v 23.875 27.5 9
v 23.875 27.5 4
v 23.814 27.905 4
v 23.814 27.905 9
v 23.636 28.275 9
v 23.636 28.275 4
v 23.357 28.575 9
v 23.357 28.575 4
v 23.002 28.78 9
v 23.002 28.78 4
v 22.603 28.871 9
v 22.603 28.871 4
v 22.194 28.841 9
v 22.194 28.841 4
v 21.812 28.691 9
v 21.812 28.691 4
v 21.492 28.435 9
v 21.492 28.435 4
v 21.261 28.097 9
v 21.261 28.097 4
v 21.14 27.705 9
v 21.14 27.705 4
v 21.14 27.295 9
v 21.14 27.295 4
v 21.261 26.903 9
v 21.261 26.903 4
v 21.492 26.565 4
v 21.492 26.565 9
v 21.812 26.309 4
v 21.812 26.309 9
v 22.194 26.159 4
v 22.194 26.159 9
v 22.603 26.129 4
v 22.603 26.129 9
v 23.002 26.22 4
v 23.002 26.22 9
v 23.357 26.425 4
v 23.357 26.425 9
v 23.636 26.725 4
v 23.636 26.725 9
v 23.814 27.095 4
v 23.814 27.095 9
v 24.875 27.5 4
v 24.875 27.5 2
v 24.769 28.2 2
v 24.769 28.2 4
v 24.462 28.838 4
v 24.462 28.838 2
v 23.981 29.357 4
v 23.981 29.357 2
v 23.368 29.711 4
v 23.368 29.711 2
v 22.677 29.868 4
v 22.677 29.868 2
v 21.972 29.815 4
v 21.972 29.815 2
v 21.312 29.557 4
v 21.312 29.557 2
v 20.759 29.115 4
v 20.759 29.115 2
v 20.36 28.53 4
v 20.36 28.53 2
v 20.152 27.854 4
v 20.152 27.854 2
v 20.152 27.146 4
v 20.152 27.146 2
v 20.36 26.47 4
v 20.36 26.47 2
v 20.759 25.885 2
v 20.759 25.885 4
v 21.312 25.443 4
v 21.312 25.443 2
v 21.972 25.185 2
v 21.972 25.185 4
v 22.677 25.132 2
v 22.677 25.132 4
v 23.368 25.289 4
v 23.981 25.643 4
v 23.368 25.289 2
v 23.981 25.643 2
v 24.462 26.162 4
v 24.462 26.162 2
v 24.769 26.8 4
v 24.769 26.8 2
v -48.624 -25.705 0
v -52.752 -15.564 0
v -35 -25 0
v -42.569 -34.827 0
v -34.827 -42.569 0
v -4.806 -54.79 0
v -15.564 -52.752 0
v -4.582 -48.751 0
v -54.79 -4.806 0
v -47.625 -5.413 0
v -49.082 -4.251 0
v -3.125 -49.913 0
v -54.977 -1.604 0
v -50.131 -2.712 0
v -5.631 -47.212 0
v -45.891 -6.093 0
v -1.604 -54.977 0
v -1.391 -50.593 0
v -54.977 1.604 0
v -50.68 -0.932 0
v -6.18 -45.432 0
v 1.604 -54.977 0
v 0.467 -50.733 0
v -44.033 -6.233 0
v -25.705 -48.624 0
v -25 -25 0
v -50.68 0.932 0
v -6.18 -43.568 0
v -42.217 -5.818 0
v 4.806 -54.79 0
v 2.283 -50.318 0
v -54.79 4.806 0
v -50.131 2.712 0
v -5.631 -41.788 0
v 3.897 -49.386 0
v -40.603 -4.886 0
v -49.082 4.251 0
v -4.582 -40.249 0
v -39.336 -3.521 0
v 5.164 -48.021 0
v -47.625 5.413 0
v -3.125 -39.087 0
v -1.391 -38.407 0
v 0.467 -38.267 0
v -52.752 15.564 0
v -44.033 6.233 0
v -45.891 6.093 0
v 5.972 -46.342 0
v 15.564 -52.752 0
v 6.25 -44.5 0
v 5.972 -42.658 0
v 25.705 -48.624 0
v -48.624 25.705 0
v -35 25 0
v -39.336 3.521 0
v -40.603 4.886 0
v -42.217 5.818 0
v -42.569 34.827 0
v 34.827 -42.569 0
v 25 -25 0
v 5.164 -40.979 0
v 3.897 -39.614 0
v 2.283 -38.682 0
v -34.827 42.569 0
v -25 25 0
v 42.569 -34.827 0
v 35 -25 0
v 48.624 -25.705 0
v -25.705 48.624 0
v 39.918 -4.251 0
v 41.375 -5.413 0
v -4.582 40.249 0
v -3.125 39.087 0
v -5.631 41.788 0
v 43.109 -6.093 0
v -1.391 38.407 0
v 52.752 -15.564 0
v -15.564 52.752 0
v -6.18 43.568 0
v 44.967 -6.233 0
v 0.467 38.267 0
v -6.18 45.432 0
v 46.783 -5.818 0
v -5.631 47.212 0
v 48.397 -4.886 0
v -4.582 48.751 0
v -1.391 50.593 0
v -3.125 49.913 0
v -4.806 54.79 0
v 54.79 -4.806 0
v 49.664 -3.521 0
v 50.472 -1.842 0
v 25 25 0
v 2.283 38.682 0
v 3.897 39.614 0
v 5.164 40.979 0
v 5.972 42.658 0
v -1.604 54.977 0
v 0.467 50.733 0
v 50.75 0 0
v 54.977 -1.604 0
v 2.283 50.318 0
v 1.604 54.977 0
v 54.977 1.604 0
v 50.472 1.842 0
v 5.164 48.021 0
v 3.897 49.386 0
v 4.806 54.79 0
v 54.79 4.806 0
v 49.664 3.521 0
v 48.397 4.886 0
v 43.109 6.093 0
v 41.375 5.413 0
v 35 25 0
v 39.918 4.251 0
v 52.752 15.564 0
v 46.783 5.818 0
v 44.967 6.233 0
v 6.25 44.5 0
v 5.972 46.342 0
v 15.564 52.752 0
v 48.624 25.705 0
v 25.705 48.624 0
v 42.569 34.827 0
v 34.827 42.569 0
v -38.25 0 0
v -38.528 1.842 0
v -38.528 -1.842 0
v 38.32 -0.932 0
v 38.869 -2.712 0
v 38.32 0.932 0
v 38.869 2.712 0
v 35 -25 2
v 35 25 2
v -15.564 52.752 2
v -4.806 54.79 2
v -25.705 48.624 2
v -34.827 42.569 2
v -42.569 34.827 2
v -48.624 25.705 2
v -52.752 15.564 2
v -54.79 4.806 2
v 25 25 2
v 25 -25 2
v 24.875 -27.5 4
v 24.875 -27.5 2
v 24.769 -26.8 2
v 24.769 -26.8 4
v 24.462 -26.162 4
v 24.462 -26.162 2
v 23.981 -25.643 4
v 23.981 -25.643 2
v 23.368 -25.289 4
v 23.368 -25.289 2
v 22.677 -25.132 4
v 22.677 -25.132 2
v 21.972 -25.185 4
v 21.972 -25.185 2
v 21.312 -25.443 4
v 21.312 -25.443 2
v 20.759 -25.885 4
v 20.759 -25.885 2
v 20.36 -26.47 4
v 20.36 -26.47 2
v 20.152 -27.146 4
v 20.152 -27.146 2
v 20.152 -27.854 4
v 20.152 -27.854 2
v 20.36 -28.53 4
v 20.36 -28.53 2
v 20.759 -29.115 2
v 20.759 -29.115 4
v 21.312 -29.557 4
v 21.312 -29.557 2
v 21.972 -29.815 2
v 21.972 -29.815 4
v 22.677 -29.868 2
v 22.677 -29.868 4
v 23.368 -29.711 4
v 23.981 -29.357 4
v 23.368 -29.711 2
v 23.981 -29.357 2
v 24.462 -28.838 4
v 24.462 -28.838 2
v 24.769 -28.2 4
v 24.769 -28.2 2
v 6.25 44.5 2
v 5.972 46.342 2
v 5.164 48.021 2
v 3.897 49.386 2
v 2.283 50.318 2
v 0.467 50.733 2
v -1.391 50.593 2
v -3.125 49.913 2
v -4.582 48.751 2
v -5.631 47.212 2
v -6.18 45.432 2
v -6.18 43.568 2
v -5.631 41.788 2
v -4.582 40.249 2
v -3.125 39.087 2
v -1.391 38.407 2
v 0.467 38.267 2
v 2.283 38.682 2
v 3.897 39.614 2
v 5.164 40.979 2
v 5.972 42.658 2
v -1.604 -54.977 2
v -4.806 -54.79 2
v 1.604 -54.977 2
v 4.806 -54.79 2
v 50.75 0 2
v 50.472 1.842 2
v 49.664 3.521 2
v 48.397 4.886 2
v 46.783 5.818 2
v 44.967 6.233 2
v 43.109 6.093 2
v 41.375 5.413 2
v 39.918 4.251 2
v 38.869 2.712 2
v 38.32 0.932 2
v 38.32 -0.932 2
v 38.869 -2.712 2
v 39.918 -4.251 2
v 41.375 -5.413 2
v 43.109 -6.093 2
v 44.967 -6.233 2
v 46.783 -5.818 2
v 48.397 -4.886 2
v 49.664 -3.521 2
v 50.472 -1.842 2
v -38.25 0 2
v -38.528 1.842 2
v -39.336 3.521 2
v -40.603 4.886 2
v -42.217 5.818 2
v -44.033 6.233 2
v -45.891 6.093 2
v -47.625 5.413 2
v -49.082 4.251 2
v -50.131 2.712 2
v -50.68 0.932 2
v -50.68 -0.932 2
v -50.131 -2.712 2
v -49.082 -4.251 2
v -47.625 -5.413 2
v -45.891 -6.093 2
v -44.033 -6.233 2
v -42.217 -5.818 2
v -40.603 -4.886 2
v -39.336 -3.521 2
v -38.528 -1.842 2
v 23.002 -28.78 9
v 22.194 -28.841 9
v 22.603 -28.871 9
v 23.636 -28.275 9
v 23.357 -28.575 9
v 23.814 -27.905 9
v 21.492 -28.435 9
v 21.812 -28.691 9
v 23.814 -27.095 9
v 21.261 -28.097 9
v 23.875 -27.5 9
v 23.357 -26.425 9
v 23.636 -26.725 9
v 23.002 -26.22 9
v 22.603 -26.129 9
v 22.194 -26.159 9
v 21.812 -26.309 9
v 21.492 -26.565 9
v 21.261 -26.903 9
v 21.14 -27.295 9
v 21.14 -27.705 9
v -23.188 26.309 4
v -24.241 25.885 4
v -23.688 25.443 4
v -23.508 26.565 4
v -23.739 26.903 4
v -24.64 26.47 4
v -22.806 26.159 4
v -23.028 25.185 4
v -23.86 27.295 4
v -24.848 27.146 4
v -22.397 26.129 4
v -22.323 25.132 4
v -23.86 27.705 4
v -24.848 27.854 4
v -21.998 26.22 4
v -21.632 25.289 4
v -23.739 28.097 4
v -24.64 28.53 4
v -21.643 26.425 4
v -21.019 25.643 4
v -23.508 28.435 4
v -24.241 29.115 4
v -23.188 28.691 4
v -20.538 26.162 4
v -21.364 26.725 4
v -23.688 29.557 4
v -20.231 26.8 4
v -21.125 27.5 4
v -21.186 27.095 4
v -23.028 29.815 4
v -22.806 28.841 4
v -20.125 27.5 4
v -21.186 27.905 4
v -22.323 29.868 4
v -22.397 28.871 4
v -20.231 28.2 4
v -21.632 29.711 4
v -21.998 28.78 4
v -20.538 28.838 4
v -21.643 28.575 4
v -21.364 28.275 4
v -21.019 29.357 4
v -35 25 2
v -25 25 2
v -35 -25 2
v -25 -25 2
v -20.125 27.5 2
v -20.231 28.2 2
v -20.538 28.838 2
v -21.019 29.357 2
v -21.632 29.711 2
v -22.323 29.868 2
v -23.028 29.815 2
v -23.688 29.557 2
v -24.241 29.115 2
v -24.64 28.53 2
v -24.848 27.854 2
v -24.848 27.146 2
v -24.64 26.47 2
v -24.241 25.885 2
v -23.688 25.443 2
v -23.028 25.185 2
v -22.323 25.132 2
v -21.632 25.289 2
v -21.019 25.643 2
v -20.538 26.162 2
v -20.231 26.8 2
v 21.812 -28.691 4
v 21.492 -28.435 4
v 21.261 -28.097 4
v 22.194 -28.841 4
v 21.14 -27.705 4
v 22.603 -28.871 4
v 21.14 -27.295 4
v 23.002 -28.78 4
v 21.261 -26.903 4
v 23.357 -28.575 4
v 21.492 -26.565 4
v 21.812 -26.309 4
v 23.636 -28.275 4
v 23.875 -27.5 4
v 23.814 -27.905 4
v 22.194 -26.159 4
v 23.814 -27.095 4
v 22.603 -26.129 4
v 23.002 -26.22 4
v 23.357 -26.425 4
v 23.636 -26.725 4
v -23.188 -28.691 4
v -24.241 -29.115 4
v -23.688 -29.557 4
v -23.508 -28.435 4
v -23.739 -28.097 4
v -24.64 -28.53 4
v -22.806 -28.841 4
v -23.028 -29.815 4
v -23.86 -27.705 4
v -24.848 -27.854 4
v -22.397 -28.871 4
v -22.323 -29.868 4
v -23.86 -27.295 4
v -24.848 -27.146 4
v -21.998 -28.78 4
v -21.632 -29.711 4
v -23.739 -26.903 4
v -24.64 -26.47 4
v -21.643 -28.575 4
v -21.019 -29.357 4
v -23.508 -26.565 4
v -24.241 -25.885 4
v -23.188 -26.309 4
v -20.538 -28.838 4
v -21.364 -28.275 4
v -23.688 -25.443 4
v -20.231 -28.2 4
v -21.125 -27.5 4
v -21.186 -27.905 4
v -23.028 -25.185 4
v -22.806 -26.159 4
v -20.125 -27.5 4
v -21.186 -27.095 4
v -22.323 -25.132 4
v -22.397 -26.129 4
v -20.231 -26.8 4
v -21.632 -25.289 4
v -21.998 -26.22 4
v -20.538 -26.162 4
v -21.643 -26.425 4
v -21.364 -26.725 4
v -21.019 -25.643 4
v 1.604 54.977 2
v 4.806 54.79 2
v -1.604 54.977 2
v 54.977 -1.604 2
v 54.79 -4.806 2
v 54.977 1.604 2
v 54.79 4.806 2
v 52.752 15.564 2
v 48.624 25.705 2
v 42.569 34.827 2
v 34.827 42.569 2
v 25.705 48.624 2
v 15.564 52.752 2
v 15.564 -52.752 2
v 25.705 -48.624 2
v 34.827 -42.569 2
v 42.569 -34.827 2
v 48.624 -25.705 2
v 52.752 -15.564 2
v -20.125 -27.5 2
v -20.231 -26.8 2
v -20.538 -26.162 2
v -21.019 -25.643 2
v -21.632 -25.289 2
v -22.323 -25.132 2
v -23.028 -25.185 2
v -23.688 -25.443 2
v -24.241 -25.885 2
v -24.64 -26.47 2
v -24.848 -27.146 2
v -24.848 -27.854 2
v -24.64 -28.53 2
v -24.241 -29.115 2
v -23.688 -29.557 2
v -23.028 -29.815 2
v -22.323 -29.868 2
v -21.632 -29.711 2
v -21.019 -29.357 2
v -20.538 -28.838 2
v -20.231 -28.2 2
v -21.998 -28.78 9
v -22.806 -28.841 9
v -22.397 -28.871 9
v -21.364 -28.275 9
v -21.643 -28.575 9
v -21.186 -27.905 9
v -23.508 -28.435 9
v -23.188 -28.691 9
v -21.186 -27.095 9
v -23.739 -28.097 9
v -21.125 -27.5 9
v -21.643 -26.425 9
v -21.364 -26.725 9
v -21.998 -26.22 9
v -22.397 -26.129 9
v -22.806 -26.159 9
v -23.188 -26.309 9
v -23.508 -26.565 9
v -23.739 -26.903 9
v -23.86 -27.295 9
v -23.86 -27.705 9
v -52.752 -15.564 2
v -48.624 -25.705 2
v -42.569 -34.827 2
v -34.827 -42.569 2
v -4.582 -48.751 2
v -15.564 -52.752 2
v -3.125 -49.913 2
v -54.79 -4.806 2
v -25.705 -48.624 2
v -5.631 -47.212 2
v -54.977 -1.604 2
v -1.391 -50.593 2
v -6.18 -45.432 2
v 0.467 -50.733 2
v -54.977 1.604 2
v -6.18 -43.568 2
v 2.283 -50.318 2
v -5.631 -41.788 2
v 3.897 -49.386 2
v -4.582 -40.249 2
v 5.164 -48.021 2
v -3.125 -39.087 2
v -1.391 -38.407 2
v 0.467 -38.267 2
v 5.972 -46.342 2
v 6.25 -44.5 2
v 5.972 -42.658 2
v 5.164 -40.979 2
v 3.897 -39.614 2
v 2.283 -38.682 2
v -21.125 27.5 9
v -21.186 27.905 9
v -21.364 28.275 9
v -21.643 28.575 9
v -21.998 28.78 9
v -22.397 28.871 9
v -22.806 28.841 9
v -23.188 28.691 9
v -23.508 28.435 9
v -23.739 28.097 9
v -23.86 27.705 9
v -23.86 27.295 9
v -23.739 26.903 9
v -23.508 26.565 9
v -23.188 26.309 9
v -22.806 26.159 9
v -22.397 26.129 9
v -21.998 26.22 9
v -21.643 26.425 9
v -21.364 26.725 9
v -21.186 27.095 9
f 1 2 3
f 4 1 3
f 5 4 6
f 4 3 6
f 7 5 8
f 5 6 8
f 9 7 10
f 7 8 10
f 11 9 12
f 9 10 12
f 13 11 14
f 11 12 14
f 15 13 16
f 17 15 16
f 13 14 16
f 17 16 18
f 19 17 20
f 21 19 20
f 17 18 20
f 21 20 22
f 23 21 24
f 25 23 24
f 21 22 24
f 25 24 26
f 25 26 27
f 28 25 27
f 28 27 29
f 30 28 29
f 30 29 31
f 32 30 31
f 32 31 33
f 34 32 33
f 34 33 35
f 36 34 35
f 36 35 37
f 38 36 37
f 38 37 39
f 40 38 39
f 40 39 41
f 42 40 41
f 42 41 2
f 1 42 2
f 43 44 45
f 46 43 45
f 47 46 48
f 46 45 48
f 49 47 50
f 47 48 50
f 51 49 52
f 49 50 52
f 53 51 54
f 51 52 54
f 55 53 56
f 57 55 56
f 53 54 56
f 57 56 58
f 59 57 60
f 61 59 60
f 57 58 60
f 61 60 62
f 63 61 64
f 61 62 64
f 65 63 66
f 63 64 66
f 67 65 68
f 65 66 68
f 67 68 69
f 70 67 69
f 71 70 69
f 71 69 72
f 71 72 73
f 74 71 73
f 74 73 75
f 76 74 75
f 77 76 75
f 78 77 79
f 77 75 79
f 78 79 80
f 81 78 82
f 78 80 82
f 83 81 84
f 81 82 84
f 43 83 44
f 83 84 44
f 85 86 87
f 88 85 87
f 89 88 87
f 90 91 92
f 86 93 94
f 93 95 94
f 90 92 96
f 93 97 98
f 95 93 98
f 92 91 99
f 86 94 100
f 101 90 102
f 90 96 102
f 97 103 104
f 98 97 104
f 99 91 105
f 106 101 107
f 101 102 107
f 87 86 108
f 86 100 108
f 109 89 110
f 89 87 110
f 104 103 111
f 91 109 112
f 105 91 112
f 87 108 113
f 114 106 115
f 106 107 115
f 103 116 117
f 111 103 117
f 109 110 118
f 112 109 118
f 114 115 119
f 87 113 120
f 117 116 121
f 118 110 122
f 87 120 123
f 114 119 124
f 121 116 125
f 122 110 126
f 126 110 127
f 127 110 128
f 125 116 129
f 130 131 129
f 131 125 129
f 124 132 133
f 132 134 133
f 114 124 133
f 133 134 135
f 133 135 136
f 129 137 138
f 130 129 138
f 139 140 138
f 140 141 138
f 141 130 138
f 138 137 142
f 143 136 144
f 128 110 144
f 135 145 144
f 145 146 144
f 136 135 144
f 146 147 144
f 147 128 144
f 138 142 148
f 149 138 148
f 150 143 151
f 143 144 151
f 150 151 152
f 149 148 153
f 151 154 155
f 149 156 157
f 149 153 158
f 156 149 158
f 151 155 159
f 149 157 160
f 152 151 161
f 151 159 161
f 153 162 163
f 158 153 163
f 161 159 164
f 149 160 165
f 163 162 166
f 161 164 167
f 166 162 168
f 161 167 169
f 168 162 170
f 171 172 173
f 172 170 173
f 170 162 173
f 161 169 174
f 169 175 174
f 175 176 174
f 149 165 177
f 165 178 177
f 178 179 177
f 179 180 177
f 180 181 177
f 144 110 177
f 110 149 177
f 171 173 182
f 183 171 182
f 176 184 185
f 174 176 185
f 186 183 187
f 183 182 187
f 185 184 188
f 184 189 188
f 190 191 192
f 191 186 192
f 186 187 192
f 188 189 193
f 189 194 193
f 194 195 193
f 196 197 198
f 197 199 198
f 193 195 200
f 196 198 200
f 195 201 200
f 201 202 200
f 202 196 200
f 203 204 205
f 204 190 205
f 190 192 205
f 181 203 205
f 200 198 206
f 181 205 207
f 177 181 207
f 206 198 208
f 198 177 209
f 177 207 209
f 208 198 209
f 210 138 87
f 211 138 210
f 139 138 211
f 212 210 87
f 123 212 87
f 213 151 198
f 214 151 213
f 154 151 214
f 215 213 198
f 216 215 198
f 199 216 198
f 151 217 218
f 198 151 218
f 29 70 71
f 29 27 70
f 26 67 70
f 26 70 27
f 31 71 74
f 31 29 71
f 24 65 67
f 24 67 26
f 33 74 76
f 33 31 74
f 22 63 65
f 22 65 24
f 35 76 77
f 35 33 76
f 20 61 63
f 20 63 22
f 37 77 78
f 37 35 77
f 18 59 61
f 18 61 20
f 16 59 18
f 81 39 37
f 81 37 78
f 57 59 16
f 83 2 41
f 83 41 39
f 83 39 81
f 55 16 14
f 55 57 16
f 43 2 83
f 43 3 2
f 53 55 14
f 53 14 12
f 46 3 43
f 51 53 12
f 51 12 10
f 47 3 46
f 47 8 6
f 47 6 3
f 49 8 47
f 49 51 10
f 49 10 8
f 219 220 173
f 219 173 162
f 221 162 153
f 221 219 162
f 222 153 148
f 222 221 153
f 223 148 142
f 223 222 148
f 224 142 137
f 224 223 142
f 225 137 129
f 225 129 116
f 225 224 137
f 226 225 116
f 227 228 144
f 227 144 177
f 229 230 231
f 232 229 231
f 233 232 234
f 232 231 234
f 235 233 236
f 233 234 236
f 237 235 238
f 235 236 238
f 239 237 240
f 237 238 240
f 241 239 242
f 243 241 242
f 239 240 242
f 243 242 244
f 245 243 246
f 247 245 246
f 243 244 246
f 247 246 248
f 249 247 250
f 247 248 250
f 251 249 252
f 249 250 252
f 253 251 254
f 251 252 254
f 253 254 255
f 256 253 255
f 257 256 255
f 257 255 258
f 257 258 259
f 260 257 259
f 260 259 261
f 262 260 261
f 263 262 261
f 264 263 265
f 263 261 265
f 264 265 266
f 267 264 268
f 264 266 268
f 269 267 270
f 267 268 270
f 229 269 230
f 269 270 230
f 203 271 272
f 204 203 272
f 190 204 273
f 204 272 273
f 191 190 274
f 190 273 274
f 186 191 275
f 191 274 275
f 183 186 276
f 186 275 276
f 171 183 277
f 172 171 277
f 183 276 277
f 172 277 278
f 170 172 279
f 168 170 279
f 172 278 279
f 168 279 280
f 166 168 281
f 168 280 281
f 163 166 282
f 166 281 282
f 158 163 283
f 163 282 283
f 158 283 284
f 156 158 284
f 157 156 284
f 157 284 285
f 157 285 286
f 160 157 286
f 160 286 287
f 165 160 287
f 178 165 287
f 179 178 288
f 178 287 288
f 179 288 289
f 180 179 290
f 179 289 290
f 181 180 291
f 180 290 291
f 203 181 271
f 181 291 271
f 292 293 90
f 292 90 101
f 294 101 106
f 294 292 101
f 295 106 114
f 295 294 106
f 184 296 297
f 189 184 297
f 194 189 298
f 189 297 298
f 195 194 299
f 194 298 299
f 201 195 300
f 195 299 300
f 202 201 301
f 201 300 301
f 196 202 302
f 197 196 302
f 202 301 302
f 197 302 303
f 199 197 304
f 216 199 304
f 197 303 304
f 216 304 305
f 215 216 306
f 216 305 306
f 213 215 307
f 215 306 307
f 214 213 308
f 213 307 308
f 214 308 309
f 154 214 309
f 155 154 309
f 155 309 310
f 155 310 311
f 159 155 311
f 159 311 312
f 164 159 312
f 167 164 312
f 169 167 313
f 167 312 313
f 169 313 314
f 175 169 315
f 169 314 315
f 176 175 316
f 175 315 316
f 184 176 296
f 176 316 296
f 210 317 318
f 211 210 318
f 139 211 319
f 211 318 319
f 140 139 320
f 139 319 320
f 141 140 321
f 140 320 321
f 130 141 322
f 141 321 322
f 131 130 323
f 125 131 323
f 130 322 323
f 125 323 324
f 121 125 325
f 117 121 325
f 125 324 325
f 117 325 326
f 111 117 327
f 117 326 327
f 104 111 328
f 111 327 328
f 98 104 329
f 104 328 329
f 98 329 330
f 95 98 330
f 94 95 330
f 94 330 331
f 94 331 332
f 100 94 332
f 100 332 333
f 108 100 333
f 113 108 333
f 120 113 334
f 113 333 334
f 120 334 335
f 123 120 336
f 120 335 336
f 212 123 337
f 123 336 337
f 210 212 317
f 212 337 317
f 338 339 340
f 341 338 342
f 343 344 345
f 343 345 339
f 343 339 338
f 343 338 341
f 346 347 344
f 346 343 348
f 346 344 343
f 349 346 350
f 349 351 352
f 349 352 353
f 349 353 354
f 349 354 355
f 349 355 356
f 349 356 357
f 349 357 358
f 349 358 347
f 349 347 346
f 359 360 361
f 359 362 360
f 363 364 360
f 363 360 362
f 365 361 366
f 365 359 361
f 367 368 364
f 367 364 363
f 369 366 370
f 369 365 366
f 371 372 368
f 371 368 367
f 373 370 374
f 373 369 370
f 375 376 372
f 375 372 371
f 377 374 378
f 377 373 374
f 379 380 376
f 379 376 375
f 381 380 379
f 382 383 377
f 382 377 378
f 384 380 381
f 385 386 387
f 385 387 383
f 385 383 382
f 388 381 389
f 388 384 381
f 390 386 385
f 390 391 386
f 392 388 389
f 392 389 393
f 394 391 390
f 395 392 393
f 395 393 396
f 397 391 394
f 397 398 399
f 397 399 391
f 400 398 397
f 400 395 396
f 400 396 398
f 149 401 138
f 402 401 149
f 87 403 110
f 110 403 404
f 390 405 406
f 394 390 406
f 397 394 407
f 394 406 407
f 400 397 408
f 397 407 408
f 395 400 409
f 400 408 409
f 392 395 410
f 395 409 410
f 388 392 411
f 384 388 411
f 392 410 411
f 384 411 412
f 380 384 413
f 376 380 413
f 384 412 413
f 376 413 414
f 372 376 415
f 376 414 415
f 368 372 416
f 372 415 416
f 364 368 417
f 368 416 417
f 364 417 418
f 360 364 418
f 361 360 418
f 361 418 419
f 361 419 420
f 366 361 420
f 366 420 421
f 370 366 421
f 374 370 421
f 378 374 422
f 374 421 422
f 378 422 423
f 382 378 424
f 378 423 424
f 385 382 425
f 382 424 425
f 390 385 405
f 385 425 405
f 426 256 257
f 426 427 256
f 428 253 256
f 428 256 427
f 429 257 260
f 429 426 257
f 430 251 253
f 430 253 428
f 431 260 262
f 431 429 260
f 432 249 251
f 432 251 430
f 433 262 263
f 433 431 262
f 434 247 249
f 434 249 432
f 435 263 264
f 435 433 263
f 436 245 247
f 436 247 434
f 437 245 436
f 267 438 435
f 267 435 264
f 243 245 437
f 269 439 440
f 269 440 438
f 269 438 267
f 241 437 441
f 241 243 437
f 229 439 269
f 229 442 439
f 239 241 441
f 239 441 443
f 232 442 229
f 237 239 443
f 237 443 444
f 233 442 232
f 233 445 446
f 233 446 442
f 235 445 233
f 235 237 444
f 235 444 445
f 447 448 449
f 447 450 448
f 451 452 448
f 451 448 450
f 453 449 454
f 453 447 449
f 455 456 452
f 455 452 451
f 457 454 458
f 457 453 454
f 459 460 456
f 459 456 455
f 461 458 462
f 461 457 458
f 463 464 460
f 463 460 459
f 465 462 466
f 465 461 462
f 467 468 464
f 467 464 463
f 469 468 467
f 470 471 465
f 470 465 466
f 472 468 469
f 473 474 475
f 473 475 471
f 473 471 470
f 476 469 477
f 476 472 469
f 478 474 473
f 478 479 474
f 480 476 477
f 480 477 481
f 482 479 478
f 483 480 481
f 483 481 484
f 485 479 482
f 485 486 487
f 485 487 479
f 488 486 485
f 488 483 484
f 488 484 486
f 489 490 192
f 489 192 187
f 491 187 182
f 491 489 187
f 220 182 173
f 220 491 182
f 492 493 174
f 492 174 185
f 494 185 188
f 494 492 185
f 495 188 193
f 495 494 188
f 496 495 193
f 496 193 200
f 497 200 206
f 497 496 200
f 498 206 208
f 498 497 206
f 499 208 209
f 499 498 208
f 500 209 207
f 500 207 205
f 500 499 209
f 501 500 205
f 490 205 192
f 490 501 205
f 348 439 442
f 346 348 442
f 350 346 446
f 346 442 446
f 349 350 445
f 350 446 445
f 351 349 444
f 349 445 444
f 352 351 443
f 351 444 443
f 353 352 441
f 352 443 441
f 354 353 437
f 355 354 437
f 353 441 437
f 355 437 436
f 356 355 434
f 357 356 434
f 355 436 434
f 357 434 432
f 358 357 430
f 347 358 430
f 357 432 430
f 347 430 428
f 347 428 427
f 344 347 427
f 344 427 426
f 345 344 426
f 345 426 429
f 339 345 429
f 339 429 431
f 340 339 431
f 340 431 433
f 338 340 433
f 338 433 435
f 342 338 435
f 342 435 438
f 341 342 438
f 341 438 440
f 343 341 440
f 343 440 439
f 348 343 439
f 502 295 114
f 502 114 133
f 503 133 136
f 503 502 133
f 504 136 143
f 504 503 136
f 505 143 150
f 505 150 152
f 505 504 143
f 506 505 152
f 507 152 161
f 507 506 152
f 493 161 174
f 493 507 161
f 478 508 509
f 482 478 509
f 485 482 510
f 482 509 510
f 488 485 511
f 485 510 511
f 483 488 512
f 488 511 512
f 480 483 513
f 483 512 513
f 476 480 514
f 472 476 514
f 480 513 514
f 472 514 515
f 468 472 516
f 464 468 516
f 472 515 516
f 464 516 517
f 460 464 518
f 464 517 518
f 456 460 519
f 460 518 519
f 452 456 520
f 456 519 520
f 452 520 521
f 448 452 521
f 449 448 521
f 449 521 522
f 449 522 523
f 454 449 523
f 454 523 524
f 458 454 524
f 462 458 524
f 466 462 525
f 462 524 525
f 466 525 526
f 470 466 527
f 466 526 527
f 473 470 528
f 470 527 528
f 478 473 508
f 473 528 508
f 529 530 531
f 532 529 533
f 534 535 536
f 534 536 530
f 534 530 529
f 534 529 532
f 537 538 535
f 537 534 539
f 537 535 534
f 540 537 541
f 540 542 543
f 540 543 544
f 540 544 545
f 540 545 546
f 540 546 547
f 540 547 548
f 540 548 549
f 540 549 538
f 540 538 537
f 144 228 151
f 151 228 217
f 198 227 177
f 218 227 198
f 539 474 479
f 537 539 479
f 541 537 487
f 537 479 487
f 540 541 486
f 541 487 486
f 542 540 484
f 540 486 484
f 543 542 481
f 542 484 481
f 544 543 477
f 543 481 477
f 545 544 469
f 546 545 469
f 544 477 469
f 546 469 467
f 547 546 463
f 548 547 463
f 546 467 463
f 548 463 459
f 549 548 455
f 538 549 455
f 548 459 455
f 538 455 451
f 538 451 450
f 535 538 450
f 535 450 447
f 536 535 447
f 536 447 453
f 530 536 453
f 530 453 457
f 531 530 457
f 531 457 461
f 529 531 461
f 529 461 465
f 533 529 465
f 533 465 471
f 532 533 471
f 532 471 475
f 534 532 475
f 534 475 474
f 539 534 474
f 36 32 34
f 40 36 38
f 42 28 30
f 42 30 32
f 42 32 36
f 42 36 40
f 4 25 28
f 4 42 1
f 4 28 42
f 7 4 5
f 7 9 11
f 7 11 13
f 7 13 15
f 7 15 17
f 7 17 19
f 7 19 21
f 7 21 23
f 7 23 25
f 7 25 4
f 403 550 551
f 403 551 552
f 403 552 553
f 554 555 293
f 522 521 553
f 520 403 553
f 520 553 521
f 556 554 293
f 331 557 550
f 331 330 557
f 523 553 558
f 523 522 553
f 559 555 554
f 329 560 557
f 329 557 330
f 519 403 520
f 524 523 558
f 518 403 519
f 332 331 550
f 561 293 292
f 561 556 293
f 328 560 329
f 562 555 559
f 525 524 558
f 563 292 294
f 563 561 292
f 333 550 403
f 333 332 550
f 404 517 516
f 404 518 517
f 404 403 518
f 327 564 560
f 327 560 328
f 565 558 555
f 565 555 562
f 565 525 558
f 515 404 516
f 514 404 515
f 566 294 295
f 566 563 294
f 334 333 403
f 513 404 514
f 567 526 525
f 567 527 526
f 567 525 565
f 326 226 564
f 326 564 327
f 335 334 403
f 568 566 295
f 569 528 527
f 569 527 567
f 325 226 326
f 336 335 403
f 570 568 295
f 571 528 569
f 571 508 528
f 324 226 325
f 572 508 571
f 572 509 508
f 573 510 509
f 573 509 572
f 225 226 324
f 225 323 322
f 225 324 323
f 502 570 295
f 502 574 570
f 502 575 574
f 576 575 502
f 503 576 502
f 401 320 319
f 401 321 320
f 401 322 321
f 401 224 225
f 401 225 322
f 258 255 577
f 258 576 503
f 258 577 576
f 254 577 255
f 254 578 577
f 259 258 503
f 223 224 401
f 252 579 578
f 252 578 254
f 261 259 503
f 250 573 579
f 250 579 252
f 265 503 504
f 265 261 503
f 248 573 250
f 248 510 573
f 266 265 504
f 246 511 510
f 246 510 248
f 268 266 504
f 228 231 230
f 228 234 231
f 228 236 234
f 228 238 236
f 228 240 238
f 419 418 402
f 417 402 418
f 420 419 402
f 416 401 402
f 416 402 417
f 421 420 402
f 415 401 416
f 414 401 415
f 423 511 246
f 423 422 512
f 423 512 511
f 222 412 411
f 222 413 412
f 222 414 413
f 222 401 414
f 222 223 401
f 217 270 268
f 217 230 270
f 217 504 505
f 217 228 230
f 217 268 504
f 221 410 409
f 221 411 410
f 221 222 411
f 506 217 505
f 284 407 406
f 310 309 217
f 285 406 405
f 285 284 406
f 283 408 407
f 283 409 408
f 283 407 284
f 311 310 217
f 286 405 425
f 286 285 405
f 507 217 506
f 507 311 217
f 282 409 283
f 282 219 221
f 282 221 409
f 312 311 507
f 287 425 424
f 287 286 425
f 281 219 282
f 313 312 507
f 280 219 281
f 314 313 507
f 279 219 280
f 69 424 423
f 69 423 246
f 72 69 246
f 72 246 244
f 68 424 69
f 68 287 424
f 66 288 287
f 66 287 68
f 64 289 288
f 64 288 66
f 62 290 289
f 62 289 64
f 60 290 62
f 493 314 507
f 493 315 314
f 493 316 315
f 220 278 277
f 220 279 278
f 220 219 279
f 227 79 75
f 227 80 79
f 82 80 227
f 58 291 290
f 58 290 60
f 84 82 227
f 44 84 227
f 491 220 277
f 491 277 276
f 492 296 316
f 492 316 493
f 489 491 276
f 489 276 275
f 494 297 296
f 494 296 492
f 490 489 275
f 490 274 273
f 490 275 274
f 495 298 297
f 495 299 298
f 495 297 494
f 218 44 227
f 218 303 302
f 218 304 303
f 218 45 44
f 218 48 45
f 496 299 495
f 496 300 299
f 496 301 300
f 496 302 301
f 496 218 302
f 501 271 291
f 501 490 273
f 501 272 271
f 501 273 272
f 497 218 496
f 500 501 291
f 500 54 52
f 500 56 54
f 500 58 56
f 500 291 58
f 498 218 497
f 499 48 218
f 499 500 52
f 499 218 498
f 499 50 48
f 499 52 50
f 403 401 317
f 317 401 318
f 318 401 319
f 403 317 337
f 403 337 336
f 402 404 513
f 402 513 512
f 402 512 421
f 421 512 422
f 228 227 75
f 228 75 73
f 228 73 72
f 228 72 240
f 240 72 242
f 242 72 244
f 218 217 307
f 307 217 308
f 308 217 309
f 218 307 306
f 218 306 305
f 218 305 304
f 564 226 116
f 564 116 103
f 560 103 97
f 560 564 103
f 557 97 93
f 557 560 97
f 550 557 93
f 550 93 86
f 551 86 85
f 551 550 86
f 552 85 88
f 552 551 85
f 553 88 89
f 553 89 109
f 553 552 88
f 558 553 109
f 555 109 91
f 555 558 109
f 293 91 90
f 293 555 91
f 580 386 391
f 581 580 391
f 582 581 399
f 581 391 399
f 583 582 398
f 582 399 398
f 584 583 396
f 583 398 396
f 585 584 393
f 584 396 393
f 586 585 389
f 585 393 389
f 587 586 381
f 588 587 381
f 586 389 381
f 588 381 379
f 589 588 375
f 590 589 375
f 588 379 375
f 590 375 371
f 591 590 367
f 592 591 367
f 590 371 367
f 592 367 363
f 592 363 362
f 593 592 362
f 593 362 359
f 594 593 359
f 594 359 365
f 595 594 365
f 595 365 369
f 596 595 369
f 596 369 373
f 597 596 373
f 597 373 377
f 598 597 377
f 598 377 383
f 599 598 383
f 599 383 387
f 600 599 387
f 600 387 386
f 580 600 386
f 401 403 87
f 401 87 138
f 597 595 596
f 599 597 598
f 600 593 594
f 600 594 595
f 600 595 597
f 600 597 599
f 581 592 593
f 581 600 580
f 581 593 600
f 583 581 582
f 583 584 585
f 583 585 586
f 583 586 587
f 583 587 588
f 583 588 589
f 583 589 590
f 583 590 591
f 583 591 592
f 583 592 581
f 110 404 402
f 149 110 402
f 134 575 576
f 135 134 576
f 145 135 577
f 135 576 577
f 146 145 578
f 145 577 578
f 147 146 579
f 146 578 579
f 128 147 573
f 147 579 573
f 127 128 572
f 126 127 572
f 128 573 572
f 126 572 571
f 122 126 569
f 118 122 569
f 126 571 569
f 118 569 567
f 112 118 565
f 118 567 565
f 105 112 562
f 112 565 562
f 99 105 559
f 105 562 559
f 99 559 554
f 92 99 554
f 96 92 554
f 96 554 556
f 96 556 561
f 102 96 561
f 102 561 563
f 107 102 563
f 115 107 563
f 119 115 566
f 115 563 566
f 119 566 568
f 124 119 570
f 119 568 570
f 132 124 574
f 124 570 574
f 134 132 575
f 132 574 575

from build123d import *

# Parameters (mm, degrees)
SKETCH4_R           = 59
BOSS_EXTRUDE3_DEPTH = 2
SKETCH5_R           = 1.375
BOSS_EXTRUDE5_DEPTH = 7
SKETCH8_R           = 2.375
BOSS_EXTRUDE6_DEPTH = 2
BOSS_EXTRUDE7_DEPTH = 18
SKETCH10_R          = 7.5
CUT_EXTRUDE1_DEPTH  = 18
SKETCH12_R          = 57.5
CUT_EXTRUDE2_DEPTH  = 5
CUT_EXTRUDE3_DEPTH  = 5.5
SKETCH15_R          = 89.714021058
SKETCH15_R_2        = 57
CUT_EXTRUDE4_DEPTH  = 22
SKETCH16_R          = 62.462022857
CUT_EXTRUDE8_DEPTH  = 52
CUT_EXTRUDE9_DEPTH  = 52
SKETCH18_R          = 80.62246508
SKETCH18_R_2        = 55
CUT_EXTRUDE10_DEPTH = 10
SKETCH19_R          = 55
BOSS_EXTRUDE8_DEPTH = 2
SKETCH20_R          = 6.25
CUT_EXTRUDE11_DEPTH = 2
SKETCH21_W          = 10
SKETCH21_H          = 50
CUT_EXTRUDE12_DEPTH = 3


with BuildPart() as part:
    # Sketch4 → Boss-Extrude3 (new body)
    with BuildSketch(Plane.XY):
        Circle(SKETCH4_R)
    extrude(amount=BOSS_EXTRUDE3_DEPTH)

    # Sketch5 → Boss-Extrude5 (add)
    with BuildSketch(Plane.XY.offset(2)):
        with Locations((-22.5, 27.5)):
            Circle(SKETCH5_R)
        with Locations((22.5, 27.5)):
            Circle(SKETCH5_R)
        with Locations((22.5, -27.5)):
            Circle(SKETCH5_R)
        with Locations((-22.5, -27.5)):
            Circle(SKETCH5_R)
    extrude(amount=BOSS_EXTRUDE5_DEPTH)

    # Sketch8 → Boss-Extrude6 (add)
    with BuildSketch(Plane.XY.offset(2)):
        with Locations((-22.5, 27.5)):
            Circle(SKETCH8_R)
        with Locations((22.5, 27.5)):
            Circle(SKETCH8_R)
        with Locations((-22.5, -27.5)):
            Circle(SKETCH8_R)
        with Locations((22.5, -27.5)):
            Circle(SKETCH8_R)
    extrude(amount=BOSS_EXTRUDE6_DEPTH)

    # Sketch9 → Boss-Extrude7 (add)
    with BuildSketch(Plane.XY.offset(2)):
        with BuildLine():
            ThreePointArc((-4.745762712, 55.798546005), (0, 56), (4.745762712, 55.798546005))
            Line((4.745762712, 55.798546005), (5, 58.787753827))
            ThreePointArc((5, 58.787753827), (0, 59), (-5, 58.787753827))
            Line((-5, 58.787753827), (-4.745762712, 55.798546005))
        make_face()
        with BuildLine():
            Line((-55.798546005, 4.745762712), (-58.787753827, 5))
            ThreePointArc((-58.787753827, 5), (-59, 0), (-58.787753827, -5))
            Line((-58.787753827, -5), (-55.798546005, -4.745762712))
            ThreePointArc((-55.798546005, -4.745762712), (-56, 0), (-55.798546005, 4.745762712))
        make_face()
        with BuildLine():
            ThreePointArc((58.787753827, -5), (59, 0), (58.787753827, 5))
            Line((58.787753827, 5), (55.798546005, 4.745762712))
            ThreePointArc((55.798546005, 4.745762712), (56, 0), (55.798546005, -4.745762712))
            Line((55.798546005, -4.745762712), (58.787753827, -5))
        make_face()
        with BuildLine():
            ThreePointArc((-4.745762712, -55.798546005), (0, -56), (4.745762712, -55.798546005))
            Line((4.745762712, -55.798546005), (5, -58.787753827))
            ThreePointArc((5, -58.787753827), (0, -59), (-5, -58.787753827))
            Line((-5, -58.787753827), (-4.745762712, -55.798546005))
        make_face()
    extrude(amount=BOSS_EXTRUDE7_DEPTH)

    # Sketch10 → Cut-Extrude1 (cut)
    with BuildSketch(Plane.XY.offset(2)):
        with Locations((-40, 0)):
            Circle(SKETCH10_R)
    extrude(amount=-CUT_EXTRUDE1_DEPTH, mode=Mode.SUBTRACT)

    # Sketch12 → Cut-Extrude2 (cut)
    with BuildSketch(Plane.XY.offset(20)):
        Circle(SKETCH12_R)
    extrude(amount=-CUT_EXTRUDE2_DEPTH, mode=Mode.SUBTRACT)

    # Sketch13 → Cut-Extrude3 (cut)
    with BuildSketch(Plane(origin=(0, 0, 0), x_dir=(-1, 0, 0), z_dir=(0, 0, -1))):
        with BuildLine():
            Line((-57.243329786, 4.868644068), (-58.787753827, 5))
            ThreePointArc((-58.787753827, 5), (-59, 0), (-58.787753827, -5))
            Line((-58.787753827, -5), (-57.243329786, -4.868644068))
            ThreePointArc((-57.243329786, -4.868644068), (-57.45, 0), (-57.243329786, 4.868644068))
        make_face()
        with BuildLine():
            ThreePointArc((5, 58.787753827), (0, 59), (-5, 58.787753827))
            Line((-5, 58.787753827), (-4.868644068, 57.243329786))
            ThreePointArc((-4.868644068, 57.243329786), (0, 57.45), (4.868644068, 57.243329786))
            Line((4.868644068, 57.243329786), (5, 58.787753827))
        make_face()
        with BuildLine():
            Line((-4.868644068, -57.243329786), (-5, -58.787753827))
            ThreePointArc((-5, -58.787753827), (0, -59), (5, -58.787753827))
            Line((5, -58.787753827), (4.868644068, -57.243329786))
            ThreePointArc((4.868644068, -57.243329786), (0, -57.45), (-4.868644068, -57.243329786))
        make_face()
        with BuildLine():
            ThreePointArc((58.787753827, -5), (59, 0), (58.787753827, 5))
            Line((58.787753827, 5), (57.243329786, 4.868644068))
            ThreePointArc((57.243329786, 4.868644068), (57.45, 0), (57.243329786, -4.868644068))
            Line((57.243329786, -4.868644068), (58.787753827, -5))
        make_face()
    extrude(amount=-CUT_EXTRUDE3_DEPTH, mode=Mode.SUBTRACT)

    # Sketch15 → Cut-Extrude4 (cut)
    with BuildSketch(Plane(origin=(0, 0, 0), x_dir=(-1, 0, 0), z_dir=(0, 0, -1))):
        Circle(SKETCH15_R)
        Circle(SKETCH15_R_2, mode=Mode.SUBTRACT)
    extrude(amount=-CUT_EXTRUDE4_DEPTH, mode=Mode.SUBTRACT)

    # Sketch16 → Cut-Extrude8 (cut)
    with BuildSketch(Plane.XY.offset(2)):
        Circle(SKETCH16_R)
        with BuildLine():
            Line((55.798546005, 4.745762712), (56.794948612, 4.830508475))
            ThreePointArc((56.794948612, 4.830508475), (40.305086528, 40.305086528), (4.830508475, 56.794948612))
            Line((4.830508475, 56.794948612), (4.745762712, 55.798546005))
            ThreePointArc((4.745762712, 55.798546005), (0, 56), (-4.745762712, 55.798546005))
            Line((-4.745762712, 55.798546005), (-4.830508475, 56.794948612))
            ThreePointArc((-4.830508475, 56.794948612), (-40.305086528, 40.305086528), (-56.794948612, 4.830508475))
            Line((-56.794948612, 4.830508475), (-55.798546005, 4.745762712))
            ThreePointArc((-55.798546005, 4.745762712), (-56, 0), (-55.798546005, -4.745762712))
            Line((-55.798546005, -4.745762712), (-56.794948612, -4.830508475))
            ThreePointArc((-56.794948612, -4.830508475), (-40.305086528, -40.305086528), (-4.830508475, -56.794948612))
            Line((-4.830508475, -56.794948612), (-4.745762712, -55.798546005))
            ThreePointArc((-4.745762712, -55.798546005), (0, -56), (4.745762712, -55.798546005))
            Line((4.745762712, -55.798546005), (4.830508475, -56.794948612))
            ThreePointArc((4.830508475, -56.794948612), (40.305086528, -40.305086528), (56.794948612, -4.830508475))
            Line((56.794948612, -4.830508475), (55.798546005, -4.745762712))
            ThreePointArc((55.798546005, -4.745762712), (56, 0), (55.798546005, 4.745762712))
        make_face(mode=Mode.SUBTRACT)
    extrude(amount=CUT_EXTRUDE8_DEPTH, mode=Mode.SUBTRACT)

    # Sketch17 → Cut-Extrude9 (cut)
    with BuildSketch(Plane.XY.offset(2)):
        with BuildLine():
            Line((-5, 57), (5, 57))
            Line((5, 57), (4.806106124, 54.789609817))
            ThreePointArc((4.806106124, 54.789609817), (0, 55), (-4.806106124, 54.789609817))
            Line((-4.806106124, 54.789609817), (-5, 57))
        make_face()
        with BuildLine():
            Line((54.789609817, 4.806106124), (57, 5))
            Line((57, 5), (57, -5))
            Line((57, -5), (54.789609817, -4.806106124))
            ThreePointArc((54.789609817, -4.806106124), (55, 0), (54.789609817, 4.806106124))
        make_face()
        with BuildLine():
            Line((4.806106124, -54.789609817), (5, -57))
            Line((5, -57), (-5, -57))
            Line((-5, -57), (-4.806106124, -54.789609817))
            ThreePointArc((-4.806106124, -54.789609817), (0, -55), (4.806106124, -54.789609817))
        make_face()
        with BuildLine():
            Line((-54.789609817, -4.806106124), (-57, -5))
            Line((-57, -5), (-57, 5))
            Line((-57, 5), (-54.789609817, 4.806106124))
            ThreePointArc((-54.789609817, 4.806106124), (-55, 0), (-54.789609817, -4.806106124))
        make_face()
    extrude(amount=-CUT_EXTRUDE9_DEPTH, mode=Mode.SUBTRACT)

    # Sketch18 → Cut-Extrude10 (cut)
    with BuildSketch(Plane.XY.offset(2)):
        Circle(SKETCH18_R)
        Circle(SKETCH18_R_2, mode=Mode.SUBTRACT)
    extrude(amount=-CUT_EXTRUDE10_DEPTH, mode=Mode.SUBTRACT)

    # Sketch19 → Boss-Extrude8 (add)
    with BuildSketch(Plane.XY.offset(2)):
        Circle(SKETCH19_R)
    extrude(amount=-BOSS_EXTRUDE8_DEPTH)

    # Sketch20 → Cut-Extrude11 (cut)
    with BuildSketch(Plane.XY.offset(2)):
        with Locations((0, 44.5)):
            Circle(SKETCH20_R)
        with Locations((44.5, 0)):
            Circle(SKETCH20_R)
        with Locations((0, -44.5)):
            Circle(SKETCH20_R)
        with Locations((-44.5, 0)):
            Circle(SKETCH20_R)
    extrude(amount=-CUT_EXTRUDE11_DEPTH, mode=Mode.SUBTRACT)

    # Sketch21 → Cut-Extrude12 (cut)
    with BuildSketch(Plane.XY.offset(2)):
        with Locations((30, 0)):
            Rectangle(SKETCH21_W, SKETCH21_H)
        with Locations((-30, 0)):
            Rectangle(SKETCH21_W, SKETCH21_H)
    extrude(amount=-CUT_EXTRUDE12_DEPTH, mode=Mode.SUBTRACT)


solid = part.part
